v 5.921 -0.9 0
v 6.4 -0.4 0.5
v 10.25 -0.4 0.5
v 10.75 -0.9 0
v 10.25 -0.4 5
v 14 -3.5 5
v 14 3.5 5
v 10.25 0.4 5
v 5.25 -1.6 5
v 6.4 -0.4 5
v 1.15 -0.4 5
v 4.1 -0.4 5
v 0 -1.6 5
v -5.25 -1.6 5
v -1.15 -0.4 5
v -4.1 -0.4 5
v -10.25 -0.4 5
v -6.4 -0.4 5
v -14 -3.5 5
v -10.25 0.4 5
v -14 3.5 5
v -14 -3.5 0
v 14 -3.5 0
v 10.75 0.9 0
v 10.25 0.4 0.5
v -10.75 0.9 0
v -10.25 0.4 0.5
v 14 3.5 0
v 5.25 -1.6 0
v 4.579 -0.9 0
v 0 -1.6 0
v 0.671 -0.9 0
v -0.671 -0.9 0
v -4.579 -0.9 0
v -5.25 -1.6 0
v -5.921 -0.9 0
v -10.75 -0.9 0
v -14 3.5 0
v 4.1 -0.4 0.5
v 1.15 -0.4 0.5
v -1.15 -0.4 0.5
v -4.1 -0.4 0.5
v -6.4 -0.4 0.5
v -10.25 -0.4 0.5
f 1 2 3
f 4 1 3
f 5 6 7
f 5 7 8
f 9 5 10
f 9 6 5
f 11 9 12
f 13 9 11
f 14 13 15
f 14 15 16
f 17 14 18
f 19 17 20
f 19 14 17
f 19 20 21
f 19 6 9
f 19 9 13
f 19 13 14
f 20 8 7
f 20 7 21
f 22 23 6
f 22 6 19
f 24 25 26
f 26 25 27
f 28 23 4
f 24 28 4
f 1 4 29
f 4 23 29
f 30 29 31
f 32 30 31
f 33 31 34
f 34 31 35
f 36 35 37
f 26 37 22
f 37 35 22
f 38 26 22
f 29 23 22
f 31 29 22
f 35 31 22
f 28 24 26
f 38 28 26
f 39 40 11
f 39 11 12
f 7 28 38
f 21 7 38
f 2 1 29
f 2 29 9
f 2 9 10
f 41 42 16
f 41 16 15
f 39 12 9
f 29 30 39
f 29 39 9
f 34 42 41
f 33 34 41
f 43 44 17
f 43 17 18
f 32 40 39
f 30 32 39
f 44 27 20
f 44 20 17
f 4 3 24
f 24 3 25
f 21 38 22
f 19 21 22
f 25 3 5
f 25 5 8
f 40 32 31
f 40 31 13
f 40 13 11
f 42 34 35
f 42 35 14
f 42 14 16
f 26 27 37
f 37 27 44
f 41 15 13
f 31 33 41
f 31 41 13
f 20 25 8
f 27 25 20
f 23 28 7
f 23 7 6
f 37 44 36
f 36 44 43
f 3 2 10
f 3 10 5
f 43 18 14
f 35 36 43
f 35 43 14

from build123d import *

# Parameters (mm, degrees)
SKETCH_1_W          = 28
SKETCH_1_H          = 7
EXTRUDE_1_DEPTH     = 5
CUT_EXTRUDE_1_DEPTH = 16.272524349
CHAMFER_1_SIZE      = 0.5


with BuildPart() as part:
    # Эскиз1 → Бобышка-Вытянуть1 (new body)
    with BuildSketch(Plane(origin=(0, 66.754264805, 0), x_dir=(-1, 0, 0), z_dir=(0, 0, 1))):
        with Locations((0, 66.754264805)):
            Rectangle(SKETCH_1_W, SKETCH_1_H)
    extrude(amount=EXTRUDE_1_DEPTH)

    # Эскиз4 → Вырез-Вытянуть1 (cut, through all)
    with BuildSketch(Plane(origin=(0, 0, 0), x_dir=(-1, 0, 0), z_dir=(0, 0, -1))):
        Polygon((-10.25, -0.4), (-10.25, 0.4), (10.25, 0.4), (10.25, -0.4), (6.4, -0.4), (5.25, -1.6), (4.1, -0.4), (1.15, -0.4), (0, -1.6), (-1.15, -0.4), (-4.1, -0.4), (-5.25, -1.6), (-6.4, -0.4), align=None)
    extrude(amount=-CUT_EXTRUDE_1_DEPTH, mode=Mode.SUBTRACT)

    # Фаска1
    chamfer_1_edges = [part.edges().sort_by_distance(p)[0] for p in [
        (8.325, -0.4, 0),
        (2.625, -0.4, 0),
        (-2.625, -0.4, 0),
        (-8.325, -0.4, 0),
        (-10.25, 0, 0),
        (0, 0.4, 0),
        (10.25, 0, 0),
    ]]
    chamfer(chamfer_1_edges, length=CHAMFER_1_SIZE)


solid = part.part
